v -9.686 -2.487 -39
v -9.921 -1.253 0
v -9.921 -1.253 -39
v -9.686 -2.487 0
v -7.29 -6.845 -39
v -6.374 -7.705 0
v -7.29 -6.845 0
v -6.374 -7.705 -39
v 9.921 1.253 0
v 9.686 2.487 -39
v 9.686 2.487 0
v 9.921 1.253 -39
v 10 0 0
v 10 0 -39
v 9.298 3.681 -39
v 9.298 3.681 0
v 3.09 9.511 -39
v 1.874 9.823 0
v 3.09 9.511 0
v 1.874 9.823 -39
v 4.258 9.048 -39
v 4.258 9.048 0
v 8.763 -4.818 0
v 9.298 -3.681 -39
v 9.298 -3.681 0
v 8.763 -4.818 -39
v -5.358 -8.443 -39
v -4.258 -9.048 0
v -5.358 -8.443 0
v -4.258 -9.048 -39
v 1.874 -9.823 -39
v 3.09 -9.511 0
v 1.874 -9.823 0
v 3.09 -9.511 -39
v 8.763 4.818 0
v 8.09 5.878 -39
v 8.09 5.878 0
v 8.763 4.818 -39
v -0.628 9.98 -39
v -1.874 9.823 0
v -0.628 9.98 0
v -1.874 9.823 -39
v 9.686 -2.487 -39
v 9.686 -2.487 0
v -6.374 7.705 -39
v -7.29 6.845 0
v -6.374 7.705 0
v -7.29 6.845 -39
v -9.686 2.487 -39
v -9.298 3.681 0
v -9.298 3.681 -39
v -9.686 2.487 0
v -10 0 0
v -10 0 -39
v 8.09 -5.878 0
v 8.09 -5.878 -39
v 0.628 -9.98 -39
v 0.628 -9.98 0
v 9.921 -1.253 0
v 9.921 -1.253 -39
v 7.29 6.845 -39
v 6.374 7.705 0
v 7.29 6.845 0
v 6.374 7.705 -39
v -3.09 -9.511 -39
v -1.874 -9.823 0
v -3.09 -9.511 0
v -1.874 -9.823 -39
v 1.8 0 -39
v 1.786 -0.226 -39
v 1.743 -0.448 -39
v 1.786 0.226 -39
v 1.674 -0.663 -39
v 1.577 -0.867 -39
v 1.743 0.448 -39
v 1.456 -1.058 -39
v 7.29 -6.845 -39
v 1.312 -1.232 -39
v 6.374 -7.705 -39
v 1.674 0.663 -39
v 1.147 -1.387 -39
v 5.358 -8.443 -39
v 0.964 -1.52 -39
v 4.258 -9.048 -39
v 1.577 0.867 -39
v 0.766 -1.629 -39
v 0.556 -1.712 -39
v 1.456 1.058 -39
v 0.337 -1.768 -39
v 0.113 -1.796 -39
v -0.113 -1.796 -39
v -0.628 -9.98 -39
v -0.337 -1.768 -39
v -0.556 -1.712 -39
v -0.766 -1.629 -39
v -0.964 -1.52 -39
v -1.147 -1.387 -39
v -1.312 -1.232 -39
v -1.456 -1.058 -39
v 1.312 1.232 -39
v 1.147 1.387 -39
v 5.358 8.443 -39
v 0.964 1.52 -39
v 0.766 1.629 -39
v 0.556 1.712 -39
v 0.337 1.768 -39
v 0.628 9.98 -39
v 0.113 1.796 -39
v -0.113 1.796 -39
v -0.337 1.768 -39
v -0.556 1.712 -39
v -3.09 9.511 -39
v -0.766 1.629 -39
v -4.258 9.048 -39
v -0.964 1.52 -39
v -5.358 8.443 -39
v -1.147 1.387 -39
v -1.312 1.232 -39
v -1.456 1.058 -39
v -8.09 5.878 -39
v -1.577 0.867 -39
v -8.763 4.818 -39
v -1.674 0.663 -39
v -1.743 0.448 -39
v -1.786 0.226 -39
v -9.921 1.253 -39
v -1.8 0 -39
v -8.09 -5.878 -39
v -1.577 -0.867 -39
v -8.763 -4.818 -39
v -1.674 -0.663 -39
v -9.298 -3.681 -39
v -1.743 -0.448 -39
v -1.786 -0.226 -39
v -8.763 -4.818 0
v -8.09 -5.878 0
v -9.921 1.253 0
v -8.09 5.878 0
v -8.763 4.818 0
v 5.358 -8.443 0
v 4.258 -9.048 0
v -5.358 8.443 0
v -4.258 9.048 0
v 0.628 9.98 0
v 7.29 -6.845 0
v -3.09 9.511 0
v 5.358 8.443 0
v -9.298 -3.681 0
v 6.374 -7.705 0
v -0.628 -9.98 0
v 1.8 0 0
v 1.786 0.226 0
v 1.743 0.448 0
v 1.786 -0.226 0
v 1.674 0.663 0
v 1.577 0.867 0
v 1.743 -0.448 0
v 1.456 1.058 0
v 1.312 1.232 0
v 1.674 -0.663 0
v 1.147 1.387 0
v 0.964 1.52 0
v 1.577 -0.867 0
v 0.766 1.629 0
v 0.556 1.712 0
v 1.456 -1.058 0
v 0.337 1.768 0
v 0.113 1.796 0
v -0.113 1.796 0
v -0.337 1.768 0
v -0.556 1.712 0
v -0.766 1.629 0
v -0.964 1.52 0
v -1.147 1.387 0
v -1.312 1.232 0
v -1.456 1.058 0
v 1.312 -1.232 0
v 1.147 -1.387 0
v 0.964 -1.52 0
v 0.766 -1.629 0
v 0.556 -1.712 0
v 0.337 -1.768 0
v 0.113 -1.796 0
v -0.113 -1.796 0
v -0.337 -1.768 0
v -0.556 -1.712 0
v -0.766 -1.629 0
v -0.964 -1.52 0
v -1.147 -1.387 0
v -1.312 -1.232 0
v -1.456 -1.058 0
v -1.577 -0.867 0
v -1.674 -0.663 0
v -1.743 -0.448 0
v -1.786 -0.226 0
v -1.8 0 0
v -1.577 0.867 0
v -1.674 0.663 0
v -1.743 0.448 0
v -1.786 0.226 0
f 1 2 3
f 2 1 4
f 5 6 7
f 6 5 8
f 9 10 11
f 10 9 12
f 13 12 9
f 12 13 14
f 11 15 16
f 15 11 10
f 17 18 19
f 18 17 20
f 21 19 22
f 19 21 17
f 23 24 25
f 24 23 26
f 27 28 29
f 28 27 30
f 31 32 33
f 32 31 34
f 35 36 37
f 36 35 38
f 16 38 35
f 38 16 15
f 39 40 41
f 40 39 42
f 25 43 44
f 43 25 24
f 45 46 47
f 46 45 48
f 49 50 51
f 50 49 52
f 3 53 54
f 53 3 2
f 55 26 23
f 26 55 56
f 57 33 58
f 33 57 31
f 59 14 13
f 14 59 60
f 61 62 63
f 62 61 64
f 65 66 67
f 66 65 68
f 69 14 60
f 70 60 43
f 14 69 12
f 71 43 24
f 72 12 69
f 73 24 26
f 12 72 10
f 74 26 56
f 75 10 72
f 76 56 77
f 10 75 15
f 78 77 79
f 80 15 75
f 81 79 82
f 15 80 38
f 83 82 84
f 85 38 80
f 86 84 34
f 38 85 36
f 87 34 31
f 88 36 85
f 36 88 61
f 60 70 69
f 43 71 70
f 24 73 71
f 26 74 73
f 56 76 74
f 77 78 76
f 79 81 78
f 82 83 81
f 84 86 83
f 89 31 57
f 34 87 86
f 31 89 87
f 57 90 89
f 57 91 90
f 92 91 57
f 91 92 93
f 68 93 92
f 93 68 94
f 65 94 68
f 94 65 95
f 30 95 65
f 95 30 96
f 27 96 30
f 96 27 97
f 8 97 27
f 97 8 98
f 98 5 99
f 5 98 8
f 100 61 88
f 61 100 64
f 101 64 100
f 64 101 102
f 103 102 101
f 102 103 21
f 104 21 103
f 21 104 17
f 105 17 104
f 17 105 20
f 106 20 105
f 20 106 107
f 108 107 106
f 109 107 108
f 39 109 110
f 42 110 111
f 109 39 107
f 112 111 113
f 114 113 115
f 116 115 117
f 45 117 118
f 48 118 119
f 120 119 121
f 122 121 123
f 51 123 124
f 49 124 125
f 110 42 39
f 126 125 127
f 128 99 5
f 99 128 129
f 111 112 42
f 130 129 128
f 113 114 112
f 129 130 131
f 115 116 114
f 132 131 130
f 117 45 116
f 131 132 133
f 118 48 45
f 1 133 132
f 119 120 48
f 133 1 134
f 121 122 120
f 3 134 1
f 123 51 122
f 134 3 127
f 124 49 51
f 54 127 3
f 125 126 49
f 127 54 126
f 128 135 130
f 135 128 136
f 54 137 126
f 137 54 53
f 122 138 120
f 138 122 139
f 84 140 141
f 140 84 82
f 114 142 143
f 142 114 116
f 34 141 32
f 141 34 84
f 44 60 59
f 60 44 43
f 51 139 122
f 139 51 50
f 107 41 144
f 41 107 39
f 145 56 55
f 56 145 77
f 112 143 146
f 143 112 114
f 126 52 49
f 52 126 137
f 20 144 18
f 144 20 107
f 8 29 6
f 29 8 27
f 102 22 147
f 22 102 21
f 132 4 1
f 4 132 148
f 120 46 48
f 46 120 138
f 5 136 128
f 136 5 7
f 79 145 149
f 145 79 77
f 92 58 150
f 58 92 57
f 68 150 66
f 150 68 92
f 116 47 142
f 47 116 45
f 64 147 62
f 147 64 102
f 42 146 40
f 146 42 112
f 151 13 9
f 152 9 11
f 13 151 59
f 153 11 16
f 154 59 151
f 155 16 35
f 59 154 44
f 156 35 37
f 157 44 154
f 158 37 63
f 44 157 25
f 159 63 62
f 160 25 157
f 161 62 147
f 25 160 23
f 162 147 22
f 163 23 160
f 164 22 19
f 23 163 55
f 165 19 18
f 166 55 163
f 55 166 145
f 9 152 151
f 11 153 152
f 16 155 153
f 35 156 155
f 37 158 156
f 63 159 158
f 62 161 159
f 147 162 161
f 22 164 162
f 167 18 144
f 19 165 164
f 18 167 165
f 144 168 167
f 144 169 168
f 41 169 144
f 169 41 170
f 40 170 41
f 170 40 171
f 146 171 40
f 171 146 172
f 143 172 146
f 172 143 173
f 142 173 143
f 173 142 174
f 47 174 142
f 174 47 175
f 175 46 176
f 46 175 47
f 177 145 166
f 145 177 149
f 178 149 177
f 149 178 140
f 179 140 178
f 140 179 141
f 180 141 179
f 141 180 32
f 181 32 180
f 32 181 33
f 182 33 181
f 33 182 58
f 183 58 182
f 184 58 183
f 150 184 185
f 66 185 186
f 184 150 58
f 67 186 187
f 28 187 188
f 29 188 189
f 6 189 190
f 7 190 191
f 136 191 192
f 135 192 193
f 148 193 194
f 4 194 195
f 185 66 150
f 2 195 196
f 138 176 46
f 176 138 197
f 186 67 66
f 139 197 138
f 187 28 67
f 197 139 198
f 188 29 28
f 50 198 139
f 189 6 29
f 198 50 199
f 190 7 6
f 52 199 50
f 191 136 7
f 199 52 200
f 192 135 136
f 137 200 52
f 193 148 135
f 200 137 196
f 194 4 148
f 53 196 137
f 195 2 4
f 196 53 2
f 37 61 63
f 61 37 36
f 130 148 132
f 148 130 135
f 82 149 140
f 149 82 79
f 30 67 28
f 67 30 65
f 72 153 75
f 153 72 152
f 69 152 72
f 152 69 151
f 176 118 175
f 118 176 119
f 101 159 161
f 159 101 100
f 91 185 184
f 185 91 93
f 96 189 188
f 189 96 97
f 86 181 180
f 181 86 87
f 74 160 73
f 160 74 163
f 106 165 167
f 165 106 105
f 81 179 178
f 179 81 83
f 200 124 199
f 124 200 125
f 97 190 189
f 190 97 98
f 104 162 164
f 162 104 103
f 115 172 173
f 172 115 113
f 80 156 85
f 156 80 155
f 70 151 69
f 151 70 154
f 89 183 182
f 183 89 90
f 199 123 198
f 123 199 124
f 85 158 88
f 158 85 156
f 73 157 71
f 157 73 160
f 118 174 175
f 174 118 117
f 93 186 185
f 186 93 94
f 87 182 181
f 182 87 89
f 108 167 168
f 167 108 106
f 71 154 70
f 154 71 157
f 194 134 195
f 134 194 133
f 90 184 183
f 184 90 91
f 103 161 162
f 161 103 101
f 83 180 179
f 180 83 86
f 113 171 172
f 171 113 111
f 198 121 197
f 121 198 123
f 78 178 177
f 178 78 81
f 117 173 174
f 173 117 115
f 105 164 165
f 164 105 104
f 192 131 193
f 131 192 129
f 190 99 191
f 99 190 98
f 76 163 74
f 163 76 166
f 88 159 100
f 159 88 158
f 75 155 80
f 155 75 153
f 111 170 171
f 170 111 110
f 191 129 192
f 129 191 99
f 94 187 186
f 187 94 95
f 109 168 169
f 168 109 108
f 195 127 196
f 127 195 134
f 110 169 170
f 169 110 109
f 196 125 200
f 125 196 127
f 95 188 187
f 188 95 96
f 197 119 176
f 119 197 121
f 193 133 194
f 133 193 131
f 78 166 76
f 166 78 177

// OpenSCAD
$fn = 50;


difference() {
	union() {
		translate(v = [0, 0, -39.0000000000]) {
			cylinder(h = 39, r = 10.0000000000);
		}
		cylinder(h = 0, r = 20.0000000000);
	}
	union() {
		#translate(v = [0, 0, -39]) {
			cylinder(h = 39, r = 1.8000000000);
		}
	}
}
